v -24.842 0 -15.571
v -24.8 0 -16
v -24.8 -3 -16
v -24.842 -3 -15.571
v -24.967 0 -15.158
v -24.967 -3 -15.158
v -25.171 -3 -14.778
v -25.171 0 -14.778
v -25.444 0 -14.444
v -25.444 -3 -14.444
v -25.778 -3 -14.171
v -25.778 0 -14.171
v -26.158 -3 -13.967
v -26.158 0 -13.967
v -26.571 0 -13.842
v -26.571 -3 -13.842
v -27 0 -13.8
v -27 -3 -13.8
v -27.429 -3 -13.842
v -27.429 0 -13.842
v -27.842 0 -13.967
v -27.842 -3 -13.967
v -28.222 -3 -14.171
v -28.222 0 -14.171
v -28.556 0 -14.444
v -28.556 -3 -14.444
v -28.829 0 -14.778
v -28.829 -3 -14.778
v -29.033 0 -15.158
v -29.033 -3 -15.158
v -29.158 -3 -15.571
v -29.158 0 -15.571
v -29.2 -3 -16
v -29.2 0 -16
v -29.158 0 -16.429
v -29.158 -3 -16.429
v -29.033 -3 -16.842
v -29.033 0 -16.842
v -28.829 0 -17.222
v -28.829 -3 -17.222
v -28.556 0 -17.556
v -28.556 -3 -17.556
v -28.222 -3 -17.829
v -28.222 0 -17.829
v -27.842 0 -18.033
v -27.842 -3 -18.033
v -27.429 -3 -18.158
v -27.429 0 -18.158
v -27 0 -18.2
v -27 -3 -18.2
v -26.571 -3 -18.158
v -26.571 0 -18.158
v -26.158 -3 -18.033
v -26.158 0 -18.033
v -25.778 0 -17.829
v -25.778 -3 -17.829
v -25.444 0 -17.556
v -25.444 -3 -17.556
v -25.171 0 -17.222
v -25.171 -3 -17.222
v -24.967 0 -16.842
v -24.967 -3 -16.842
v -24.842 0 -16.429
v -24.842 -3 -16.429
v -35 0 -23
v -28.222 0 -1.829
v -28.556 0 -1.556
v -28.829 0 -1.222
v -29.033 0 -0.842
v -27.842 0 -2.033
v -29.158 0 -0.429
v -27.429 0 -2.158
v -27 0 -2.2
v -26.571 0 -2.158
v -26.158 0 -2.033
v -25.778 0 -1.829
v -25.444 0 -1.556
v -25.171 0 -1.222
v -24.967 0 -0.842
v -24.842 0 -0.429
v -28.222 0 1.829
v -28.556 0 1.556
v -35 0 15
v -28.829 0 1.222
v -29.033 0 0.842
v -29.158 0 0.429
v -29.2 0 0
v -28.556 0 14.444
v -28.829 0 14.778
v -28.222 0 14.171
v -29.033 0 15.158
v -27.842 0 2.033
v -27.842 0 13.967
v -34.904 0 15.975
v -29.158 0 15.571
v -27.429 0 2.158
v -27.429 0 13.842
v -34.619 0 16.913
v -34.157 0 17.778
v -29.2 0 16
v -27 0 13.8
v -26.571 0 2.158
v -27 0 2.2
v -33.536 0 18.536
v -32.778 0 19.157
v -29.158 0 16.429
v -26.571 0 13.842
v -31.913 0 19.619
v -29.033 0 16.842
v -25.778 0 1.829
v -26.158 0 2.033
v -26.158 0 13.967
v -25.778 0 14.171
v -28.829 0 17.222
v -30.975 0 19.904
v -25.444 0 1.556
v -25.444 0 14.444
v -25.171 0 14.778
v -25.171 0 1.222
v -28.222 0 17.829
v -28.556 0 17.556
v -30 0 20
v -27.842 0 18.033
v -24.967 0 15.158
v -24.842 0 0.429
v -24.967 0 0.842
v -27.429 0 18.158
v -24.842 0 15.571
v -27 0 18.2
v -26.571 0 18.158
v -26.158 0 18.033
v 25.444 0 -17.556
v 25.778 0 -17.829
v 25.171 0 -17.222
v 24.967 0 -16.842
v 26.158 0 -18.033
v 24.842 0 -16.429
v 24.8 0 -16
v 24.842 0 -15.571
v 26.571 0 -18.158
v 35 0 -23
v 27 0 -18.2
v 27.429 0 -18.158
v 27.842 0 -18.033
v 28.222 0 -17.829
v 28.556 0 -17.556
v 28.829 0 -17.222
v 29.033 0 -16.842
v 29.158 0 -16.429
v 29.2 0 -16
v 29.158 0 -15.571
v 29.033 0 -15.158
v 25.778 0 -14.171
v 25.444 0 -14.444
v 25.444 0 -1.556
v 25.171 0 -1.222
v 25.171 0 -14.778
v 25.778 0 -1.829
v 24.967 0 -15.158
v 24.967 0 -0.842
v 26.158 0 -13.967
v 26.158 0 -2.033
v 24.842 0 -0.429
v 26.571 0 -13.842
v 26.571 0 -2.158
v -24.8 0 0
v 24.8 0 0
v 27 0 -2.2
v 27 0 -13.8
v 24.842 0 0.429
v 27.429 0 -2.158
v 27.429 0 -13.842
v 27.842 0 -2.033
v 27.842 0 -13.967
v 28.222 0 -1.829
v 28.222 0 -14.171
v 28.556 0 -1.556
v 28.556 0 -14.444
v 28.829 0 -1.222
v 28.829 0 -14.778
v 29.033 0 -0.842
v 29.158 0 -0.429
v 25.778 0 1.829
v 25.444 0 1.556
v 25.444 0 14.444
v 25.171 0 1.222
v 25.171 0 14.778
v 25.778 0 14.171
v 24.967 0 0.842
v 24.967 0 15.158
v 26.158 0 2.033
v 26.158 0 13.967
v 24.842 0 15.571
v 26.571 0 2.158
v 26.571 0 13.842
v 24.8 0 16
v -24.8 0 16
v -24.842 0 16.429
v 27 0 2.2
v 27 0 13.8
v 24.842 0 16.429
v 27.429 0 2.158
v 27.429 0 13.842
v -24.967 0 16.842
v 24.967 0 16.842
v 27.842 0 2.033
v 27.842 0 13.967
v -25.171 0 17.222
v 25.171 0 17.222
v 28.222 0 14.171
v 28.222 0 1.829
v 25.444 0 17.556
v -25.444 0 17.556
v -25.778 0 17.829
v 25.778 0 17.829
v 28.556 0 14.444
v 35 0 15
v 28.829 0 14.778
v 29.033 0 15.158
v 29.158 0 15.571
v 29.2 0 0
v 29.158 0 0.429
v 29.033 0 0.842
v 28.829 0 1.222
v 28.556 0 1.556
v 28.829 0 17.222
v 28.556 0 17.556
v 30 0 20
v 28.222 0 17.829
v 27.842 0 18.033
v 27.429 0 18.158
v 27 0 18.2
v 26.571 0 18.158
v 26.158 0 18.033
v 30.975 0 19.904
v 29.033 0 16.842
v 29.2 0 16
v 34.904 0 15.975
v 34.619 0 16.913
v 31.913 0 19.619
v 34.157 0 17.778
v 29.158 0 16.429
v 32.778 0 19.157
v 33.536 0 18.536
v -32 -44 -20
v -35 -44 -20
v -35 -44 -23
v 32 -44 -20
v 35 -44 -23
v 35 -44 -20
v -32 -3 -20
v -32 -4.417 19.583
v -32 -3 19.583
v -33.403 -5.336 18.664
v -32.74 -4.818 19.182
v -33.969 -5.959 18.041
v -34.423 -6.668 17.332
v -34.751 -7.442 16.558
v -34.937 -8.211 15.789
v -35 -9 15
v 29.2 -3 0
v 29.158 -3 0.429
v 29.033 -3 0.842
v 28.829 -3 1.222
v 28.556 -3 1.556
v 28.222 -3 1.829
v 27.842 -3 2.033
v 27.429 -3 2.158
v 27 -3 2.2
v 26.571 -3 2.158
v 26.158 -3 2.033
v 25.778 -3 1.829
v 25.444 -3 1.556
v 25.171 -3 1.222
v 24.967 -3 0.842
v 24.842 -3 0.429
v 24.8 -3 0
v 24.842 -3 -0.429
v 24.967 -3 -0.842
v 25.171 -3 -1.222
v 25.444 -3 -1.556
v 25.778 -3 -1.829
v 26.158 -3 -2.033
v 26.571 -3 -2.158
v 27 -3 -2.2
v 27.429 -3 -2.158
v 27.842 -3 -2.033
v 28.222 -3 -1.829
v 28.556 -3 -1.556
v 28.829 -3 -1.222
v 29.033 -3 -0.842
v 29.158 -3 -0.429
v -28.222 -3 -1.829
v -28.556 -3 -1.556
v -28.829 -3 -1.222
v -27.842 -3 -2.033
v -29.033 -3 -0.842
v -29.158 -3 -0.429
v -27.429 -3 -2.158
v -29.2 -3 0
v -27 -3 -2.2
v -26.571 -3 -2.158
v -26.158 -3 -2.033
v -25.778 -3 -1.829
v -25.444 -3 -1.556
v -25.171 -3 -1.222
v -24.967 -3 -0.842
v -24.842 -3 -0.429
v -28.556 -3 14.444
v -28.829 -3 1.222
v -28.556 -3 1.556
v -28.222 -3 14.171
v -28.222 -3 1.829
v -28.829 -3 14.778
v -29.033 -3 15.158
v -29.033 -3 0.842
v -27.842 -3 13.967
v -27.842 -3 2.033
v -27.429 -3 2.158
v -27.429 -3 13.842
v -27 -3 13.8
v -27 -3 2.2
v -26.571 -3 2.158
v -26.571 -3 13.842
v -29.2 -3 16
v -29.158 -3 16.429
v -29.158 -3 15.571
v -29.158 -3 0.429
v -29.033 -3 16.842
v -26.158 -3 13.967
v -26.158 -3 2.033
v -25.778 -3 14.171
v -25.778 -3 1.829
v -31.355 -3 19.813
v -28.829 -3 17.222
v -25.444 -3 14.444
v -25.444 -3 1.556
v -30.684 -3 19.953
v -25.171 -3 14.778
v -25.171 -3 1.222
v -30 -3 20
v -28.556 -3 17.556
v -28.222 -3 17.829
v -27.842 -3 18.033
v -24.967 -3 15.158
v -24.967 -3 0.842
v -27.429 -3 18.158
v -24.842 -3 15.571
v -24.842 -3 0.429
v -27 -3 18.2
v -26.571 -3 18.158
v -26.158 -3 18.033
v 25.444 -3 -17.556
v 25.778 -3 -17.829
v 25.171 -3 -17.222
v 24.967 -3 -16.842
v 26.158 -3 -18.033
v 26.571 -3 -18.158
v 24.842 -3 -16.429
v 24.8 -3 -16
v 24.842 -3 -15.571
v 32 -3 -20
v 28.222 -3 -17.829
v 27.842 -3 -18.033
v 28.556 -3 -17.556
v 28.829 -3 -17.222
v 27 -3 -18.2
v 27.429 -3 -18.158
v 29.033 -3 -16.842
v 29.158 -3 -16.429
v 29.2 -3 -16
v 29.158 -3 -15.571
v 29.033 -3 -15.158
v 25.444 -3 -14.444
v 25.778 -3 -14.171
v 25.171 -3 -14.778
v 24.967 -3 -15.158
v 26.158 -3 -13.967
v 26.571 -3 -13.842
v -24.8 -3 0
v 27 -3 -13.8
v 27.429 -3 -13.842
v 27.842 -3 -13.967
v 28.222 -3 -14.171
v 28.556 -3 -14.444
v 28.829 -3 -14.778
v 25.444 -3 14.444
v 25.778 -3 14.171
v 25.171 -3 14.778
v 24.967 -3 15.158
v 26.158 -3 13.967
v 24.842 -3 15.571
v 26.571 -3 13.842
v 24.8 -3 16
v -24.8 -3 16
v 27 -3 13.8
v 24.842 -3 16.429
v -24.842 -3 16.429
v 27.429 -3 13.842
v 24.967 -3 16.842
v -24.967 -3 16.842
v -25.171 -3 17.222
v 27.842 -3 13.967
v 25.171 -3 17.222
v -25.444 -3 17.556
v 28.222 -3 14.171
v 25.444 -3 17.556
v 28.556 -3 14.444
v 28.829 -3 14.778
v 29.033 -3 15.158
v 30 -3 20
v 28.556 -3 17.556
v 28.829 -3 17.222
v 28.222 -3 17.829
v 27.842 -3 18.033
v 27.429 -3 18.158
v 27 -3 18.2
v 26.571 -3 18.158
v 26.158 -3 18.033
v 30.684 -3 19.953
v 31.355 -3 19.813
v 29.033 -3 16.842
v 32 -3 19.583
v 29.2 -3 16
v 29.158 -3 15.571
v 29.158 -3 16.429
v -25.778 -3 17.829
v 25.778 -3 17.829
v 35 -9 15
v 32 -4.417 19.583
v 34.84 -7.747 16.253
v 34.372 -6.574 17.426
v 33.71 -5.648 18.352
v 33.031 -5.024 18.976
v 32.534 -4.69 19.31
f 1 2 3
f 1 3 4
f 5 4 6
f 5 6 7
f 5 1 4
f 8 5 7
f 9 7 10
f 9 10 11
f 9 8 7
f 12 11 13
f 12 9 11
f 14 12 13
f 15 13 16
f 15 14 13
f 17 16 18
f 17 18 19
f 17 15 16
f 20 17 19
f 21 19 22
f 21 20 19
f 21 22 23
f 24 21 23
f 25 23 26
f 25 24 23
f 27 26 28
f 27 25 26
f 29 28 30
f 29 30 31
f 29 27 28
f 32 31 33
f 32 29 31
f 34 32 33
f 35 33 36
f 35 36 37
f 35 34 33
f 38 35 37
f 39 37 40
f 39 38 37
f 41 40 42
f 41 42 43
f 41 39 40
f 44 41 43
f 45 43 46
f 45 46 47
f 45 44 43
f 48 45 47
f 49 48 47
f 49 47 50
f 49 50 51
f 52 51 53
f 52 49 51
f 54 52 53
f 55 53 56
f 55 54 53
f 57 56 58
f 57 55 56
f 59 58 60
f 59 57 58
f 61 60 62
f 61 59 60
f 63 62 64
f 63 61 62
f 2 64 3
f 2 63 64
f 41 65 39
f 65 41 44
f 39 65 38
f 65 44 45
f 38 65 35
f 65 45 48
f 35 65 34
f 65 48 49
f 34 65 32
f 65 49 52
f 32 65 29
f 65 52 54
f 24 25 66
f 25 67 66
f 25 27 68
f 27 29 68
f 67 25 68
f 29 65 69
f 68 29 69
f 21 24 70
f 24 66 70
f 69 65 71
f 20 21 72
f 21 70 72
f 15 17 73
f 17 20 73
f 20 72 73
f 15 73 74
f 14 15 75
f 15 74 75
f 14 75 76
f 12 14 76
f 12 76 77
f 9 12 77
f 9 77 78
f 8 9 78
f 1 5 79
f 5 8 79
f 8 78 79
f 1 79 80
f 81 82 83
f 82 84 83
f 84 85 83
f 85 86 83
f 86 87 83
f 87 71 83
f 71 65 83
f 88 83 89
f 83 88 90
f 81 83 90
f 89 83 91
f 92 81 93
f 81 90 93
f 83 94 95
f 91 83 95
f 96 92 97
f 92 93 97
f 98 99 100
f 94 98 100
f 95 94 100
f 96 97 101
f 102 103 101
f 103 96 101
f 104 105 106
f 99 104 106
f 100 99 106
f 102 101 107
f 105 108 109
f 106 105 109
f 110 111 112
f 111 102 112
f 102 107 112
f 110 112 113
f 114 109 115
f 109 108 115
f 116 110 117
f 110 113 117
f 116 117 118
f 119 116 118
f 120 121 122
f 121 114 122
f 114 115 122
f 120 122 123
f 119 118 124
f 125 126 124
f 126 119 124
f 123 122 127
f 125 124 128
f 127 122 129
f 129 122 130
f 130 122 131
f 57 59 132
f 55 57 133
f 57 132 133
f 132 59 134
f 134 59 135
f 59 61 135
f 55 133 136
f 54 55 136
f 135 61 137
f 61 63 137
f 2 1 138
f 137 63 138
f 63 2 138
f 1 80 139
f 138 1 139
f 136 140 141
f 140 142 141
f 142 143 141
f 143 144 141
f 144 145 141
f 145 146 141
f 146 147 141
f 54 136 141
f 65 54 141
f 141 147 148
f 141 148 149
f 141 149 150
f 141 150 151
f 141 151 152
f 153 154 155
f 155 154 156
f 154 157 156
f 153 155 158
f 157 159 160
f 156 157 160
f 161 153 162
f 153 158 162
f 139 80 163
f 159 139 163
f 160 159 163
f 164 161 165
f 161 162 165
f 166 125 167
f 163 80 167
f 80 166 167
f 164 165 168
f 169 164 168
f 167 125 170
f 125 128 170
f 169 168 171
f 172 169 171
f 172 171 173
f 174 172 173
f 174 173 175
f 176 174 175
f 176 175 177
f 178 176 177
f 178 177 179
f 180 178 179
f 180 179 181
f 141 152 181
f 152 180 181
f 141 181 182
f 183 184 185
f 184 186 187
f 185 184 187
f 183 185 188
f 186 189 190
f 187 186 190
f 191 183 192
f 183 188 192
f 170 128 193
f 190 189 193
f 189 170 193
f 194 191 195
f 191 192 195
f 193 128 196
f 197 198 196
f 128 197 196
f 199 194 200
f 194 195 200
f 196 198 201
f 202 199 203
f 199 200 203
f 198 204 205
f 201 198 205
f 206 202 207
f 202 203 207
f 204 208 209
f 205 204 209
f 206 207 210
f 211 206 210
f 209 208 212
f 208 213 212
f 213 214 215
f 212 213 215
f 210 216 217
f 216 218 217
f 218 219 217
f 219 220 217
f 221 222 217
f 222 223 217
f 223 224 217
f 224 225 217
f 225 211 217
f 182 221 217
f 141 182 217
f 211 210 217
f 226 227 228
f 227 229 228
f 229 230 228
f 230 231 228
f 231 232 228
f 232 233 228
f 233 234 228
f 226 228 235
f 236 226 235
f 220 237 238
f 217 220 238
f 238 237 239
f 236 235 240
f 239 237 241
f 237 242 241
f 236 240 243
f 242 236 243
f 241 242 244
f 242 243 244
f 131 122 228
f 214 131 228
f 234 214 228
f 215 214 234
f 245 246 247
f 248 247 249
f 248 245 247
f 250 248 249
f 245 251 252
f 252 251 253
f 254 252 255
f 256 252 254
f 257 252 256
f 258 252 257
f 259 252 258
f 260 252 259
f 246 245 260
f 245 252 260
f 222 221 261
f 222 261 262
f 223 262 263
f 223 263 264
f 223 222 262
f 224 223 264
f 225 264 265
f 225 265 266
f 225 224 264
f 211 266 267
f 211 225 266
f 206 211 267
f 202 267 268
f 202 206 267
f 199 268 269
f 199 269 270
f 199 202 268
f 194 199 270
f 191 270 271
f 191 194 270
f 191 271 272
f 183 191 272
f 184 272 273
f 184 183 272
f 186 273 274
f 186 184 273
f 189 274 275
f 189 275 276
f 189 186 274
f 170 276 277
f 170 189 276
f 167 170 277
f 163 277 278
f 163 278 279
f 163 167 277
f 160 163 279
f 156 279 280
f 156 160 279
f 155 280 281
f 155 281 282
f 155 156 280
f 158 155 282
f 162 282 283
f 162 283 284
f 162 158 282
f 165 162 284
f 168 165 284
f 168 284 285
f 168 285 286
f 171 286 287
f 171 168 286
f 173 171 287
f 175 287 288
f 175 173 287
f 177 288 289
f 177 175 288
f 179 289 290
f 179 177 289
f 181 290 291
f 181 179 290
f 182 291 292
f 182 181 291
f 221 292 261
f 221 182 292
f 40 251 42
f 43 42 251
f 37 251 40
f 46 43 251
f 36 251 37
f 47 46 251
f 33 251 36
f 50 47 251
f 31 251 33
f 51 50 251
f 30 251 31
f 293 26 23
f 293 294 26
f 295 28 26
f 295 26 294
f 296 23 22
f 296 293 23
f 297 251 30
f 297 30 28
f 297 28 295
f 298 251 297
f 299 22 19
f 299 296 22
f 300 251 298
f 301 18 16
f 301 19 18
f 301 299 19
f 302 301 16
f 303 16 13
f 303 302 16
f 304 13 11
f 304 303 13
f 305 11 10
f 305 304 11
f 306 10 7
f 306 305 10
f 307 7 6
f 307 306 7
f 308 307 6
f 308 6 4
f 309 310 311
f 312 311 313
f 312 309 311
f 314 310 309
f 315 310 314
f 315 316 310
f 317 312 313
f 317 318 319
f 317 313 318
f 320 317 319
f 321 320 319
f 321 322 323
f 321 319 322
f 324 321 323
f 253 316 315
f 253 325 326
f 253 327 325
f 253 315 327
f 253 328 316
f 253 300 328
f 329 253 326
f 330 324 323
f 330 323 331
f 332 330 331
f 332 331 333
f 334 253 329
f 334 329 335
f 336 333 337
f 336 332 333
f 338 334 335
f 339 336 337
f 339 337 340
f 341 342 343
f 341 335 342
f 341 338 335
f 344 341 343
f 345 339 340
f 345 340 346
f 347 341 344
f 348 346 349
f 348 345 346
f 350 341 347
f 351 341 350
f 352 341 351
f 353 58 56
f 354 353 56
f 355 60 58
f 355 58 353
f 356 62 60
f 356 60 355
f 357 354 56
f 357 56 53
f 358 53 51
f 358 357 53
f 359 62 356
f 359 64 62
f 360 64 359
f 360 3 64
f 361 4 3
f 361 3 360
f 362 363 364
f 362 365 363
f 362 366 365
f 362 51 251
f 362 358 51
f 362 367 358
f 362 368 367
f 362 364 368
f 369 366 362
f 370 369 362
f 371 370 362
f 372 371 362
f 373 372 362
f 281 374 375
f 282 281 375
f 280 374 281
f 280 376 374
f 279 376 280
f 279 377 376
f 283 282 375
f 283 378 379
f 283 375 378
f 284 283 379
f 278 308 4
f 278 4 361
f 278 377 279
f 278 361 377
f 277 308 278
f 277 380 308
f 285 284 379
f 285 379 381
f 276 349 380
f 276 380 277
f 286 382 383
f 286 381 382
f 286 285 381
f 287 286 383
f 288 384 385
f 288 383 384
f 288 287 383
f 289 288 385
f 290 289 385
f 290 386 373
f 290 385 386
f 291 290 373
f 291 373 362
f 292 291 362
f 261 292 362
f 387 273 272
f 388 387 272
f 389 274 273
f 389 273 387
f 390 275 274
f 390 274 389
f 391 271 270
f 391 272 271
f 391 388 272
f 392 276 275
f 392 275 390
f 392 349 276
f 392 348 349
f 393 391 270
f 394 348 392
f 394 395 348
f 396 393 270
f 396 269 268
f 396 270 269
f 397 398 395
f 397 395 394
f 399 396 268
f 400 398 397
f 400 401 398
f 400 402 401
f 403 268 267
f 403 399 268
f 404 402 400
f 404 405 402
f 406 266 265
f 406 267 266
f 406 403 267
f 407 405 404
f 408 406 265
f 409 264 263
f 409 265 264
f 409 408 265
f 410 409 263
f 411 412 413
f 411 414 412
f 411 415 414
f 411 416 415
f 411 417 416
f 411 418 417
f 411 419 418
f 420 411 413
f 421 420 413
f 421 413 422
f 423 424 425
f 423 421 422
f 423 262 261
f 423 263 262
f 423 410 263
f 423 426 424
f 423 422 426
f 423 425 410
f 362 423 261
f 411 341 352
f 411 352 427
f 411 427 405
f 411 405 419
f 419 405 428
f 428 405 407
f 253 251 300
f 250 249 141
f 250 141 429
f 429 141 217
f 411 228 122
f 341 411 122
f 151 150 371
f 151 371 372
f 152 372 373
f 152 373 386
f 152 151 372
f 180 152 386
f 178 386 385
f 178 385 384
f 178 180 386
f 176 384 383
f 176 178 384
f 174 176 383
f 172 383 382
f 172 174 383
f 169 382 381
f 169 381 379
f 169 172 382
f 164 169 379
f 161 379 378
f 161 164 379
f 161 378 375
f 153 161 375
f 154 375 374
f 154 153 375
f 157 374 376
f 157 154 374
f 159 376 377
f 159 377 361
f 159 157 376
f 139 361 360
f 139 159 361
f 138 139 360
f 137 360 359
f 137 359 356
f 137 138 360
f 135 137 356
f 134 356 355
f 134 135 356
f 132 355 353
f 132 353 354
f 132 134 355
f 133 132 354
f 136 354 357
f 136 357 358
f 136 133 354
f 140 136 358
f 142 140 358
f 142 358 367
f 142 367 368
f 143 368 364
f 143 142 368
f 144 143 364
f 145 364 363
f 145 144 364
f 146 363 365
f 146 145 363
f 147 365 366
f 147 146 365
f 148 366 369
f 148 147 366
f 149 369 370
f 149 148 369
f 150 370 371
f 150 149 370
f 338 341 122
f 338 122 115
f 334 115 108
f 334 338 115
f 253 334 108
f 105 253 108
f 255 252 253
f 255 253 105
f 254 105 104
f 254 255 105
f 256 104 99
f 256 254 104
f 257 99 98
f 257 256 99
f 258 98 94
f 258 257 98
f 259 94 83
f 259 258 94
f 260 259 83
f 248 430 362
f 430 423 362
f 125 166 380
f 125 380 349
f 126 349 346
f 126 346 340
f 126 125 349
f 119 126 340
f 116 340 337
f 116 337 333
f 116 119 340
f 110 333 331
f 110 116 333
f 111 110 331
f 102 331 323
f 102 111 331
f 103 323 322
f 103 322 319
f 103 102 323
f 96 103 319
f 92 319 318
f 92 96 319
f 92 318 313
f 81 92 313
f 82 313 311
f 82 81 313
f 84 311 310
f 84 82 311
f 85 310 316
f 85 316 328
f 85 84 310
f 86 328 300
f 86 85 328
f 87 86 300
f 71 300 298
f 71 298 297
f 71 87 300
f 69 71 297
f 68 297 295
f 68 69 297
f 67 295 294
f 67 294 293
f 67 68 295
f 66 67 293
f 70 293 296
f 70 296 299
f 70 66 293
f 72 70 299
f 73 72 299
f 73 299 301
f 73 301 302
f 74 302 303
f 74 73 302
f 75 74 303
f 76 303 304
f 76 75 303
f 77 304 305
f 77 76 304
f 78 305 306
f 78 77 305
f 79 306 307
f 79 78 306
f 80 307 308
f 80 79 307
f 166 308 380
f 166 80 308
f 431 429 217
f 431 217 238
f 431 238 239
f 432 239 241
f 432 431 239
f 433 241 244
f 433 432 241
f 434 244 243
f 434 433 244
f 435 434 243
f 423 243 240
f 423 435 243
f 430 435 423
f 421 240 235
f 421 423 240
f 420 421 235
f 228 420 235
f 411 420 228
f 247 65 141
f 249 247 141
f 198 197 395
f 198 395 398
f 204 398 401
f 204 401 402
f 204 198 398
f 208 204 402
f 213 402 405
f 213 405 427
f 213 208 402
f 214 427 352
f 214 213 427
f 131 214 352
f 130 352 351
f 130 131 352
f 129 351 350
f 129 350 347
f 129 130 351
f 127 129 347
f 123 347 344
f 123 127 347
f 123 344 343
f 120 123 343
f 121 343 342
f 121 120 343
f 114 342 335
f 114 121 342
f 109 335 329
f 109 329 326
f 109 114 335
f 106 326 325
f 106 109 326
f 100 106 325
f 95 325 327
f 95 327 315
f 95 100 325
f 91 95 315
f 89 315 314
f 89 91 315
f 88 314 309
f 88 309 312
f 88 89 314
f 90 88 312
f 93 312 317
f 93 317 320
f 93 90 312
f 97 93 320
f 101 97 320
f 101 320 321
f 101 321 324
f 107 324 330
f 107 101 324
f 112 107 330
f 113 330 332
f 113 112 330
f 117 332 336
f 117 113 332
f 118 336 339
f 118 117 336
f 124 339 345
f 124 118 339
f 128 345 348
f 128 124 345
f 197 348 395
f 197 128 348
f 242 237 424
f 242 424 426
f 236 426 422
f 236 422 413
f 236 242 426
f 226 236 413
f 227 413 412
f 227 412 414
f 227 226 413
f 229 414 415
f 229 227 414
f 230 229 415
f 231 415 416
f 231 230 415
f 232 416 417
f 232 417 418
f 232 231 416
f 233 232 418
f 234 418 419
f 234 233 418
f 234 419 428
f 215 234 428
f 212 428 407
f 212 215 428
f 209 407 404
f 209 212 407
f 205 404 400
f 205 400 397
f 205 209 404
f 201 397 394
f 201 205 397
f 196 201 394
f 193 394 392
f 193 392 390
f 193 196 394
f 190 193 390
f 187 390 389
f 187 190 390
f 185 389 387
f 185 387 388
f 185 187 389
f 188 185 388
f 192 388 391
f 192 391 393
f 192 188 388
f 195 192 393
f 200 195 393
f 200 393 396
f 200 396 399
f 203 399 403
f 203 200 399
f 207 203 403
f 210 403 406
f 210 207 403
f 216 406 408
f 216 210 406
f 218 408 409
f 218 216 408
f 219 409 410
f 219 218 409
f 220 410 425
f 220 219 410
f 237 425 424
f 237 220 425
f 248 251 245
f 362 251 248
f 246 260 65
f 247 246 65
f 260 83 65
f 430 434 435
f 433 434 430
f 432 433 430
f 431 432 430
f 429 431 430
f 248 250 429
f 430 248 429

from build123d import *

# Parameters (mm, degrees)
F0_W     = 64
F0_H     = 40
F0_R     = 2.2
F0_H_2   = 3
F1_DEPTH = 3
F2_DEPTH = 44
F3_SIZE  = 40
F4_R     = 5


with BuildPart() as f1:
    # F0 (on Front) → F1 (new body)
    with BuildSketch(Plane.XZ):
        Rectangle(F0_W, F0_H)
        with Locations((-27, -16)):
            Circle(F0_R, mode=Mode.SUBTRACT)
        with Locations((27, -16)):
            Circle(F0_R, mode=Mode.SUBTRACT)
        with Locations((-27, 0)):
            Circle(F0_R, mode=Mode.SUBTRACT)
        with Locations((-27, 16)):
            Circle(F0_R, mode=Mode.SUBTRACT)
        with Locations((27, 0)):
            Circle(F0_R, mode=Mode.SUBTRACT)
        with Locations((27, 16)):
            Circle(F0_R, mode=Mode.SUBTRACT)
        Polygon((32, 20), (32, -20), (32, -23), (35, -23), (35, 20), align=None)
        Polygon((-32, -23), (-32, -20), (-32, 20), (-35, 20), (-35, -23), align=None)
        with Locations((0, -21.5)):
            Rectangle(F0_W, F0_H_2)
    extrude(amount=F1_DEPTH)

    # F0 (on Front) → F2 (join)
    with BuildSketch(Plane.XZ):
        with Locations((0, -21.5)):
            Rectangle(F0_W, F0_H_2)
        Polygon((32, 20), (32, -20), (32, -23), (35, -23), (35, 20), align=None)
        Polygon((-32, -23), (-32, -20), (-32, 20), (-35, 20), (-35, -23), align=None)
    extrude(amount=F2_DEPTH)

    # F3
    f3_edges = [f1.edges().sort_by_distance(p)[0] for p in [
        (-33.5, -44, 20),
        (33.5, -44, 20),
    ]]
    chamfer(f3_edges, length=F3_SIZE)

    # F4
    f4_edges = [f1.edges().sort_by_distance(p)[0] for p in [
        (35, -2, 20),
        (-35, -2, 20),
    ]]
    fillet(f4_edges, radius=F4_R)


solid = f1.part
